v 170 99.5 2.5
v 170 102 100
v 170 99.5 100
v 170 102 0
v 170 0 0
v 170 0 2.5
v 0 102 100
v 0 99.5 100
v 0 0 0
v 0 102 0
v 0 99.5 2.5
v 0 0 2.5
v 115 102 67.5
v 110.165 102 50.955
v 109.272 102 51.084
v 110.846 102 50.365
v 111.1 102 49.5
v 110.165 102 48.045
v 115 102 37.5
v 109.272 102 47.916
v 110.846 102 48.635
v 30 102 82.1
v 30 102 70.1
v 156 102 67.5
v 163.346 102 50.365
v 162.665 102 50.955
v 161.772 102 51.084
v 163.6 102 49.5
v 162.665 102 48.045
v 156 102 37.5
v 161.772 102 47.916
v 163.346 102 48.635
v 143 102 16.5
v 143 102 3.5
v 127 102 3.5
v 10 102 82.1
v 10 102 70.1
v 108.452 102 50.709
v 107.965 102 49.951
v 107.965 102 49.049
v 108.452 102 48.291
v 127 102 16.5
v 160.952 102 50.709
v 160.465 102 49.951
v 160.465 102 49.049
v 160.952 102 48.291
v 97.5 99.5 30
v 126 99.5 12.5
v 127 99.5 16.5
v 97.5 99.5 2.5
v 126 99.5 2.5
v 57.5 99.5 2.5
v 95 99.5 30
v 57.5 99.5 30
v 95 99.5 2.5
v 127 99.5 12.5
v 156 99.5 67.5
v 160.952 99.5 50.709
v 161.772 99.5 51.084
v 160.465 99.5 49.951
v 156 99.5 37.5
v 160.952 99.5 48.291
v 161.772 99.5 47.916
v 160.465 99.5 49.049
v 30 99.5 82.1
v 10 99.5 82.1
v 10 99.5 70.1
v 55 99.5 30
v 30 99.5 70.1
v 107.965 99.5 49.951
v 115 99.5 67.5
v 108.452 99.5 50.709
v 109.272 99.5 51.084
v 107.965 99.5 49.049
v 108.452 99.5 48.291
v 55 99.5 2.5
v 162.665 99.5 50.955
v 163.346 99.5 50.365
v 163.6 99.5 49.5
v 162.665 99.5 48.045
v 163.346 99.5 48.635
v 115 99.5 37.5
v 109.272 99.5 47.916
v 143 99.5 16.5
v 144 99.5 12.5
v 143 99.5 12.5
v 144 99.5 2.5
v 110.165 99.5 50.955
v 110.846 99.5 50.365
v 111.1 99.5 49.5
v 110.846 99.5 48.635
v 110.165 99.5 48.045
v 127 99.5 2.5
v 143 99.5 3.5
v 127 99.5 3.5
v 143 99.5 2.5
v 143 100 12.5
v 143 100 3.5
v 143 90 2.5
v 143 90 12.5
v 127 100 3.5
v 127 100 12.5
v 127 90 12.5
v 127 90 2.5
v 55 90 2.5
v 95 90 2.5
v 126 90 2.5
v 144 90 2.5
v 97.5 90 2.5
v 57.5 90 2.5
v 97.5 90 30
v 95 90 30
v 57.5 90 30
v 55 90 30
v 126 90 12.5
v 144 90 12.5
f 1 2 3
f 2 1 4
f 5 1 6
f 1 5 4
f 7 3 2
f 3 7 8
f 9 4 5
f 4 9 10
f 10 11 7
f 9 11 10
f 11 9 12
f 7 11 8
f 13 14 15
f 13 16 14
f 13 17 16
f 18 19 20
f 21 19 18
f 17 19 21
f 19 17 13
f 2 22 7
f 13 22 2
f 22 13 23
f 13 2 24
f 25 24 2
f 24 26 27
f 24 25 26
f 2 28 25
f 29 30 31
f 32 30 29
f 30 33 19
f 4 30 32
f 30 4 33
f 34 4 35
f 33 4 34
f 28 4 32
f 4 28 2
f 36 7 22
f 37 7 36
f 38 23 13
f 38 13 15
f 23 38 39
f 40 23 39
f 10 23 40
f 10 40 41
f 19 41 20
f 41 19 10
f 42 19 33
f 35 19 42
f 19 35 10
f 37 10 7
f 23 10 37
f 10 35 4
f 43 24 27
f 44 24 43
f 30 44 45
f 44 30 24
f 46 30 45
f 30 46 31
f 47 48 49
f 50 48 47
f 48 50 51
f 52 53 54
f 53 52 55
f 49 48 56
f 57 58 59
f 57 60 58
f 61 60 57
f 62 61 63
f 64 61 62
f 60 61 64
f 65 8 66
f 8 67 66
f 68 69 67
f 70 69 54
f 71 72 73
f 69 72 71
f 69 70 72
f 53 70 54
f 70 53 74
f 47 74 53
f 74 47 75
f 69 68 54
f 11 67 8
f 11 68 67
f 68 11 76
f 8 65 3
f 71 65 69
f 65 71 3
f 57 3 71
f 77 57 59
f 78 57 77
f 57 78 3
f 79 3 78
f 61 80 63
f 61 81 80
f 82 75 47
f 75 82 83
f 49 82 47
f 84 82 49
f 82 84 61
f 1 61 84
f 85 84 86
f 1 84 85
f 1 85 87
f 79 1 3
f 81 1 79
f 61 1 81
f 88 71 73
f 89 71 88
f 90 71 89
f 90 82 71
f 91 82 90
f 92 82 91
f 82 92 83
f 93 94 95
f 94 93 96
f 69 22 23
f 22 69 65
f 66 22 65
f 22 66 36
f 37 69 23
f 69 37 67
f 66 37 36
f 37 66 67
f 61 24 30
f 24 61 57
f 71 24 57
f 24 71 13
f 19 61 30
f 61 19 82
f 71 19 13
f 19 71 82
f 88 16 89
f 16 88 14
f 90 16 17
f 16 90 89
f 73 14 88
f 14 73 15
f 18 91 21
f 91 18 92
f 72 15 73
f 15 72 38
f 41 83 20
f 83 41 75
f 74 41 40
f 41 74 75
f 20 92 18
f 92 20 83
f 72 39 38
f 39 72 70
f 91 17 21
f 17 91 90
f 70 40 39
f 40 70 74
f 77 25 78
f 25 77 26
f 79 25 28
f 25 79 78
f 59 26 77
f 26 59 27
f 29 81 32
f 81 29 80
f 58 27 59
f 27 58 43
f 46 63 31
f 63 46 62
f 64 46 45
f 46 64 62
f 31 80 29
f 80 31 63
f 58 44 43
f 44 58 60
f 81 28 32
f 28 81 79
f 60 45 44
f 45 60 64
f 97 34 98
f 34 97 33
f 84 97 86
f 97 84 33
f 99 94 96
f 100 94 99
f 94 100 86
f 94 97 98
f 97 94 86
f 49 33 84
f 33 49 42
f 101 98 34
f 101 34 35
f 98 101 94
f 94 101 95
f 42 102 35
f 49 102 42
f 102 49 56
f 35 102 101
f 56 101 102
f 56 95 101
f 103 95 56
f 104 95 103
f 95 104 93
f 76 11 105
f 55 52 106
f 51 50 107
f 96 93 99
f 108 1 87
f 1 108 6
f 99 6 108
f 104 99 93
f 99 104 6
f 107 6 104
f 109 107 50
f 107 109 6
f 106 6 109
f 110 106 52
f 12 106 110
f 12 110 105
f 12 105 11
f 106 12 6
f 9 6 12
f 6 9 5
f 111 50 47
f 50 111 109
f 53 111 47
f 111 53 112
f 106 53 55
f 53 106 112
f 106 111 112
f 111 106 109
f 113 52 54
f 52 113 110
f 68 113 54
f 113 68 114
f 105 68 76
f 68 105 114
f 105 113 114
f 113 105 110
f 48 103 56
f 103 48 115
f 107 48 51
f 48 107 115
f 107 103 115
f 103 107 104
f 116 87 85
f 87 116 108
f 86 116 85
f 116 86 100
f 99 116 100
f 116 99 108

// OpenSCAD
$fa=1;$fs=0.1;
scale([10, 10, 10]) {
meter_plane_w = 7;
// ground plate
cube([10 + meter_plane_w,10,0.25]);
// side plane
x_meter = 11.5;
y_meter = 2+2;
w_meter = 4;
h_meter = 2.5;
holes_span = 5.4;
diam_screw = 0.3;
ethernet_w = 1.6;
ethernet_x = 10 + meter_plane_w / 2 - ethernet_w / 2;
difference() {
translate([0,9.95,0]) difference(){ cube([10 + meter_plane_w,0.25,10]);
    // hole for wires for rgb led panel
    translate([1,-0.1,7.01]) cube([2,0.7,1.2]);
    // gauge main
    translate([x_meter, -0.1, y_meter -0.25]) cube([w_meter+0.1,0.7,h_meter+0.5]);
};
    // gauge screw holes
    translate([x_meter + w_meter / 2 - holes_span / 2 + diam_screw /2, 11, y_meter + h_meter / 2 - diam_screw]) rotate([90,0,0]) cylinder(2,0.15+0.01,0.15+0.01);
    
    translate([x_meter + w_meter / 2 + holes_span / 2, 11, y_meter + h_meter / 2 - diam_screw]) rotate([90,0,0]) cylinder(2,0.15+0.01,0.15+0.01);

    // Ethernet
    color([1,0,0]) translate([ethernet_x, 9, 1.7 + 0.25 -1.6]) cube([1.6, 2, 1.3]);
}
// firmness
translate([9.5,9,0]) cube([0.25,1,3]);
translate([5.5,9,0]) cube([0.25,1,3]);

// ethernet holders
translate([ethernet_x - 0.1, 9, 0.25]) cube([0.1, 1, 1.0]);
translate([ethernet_x + ethernet_w, 9, 0.25]) cube([0.1, 1, 1.0]);
}
